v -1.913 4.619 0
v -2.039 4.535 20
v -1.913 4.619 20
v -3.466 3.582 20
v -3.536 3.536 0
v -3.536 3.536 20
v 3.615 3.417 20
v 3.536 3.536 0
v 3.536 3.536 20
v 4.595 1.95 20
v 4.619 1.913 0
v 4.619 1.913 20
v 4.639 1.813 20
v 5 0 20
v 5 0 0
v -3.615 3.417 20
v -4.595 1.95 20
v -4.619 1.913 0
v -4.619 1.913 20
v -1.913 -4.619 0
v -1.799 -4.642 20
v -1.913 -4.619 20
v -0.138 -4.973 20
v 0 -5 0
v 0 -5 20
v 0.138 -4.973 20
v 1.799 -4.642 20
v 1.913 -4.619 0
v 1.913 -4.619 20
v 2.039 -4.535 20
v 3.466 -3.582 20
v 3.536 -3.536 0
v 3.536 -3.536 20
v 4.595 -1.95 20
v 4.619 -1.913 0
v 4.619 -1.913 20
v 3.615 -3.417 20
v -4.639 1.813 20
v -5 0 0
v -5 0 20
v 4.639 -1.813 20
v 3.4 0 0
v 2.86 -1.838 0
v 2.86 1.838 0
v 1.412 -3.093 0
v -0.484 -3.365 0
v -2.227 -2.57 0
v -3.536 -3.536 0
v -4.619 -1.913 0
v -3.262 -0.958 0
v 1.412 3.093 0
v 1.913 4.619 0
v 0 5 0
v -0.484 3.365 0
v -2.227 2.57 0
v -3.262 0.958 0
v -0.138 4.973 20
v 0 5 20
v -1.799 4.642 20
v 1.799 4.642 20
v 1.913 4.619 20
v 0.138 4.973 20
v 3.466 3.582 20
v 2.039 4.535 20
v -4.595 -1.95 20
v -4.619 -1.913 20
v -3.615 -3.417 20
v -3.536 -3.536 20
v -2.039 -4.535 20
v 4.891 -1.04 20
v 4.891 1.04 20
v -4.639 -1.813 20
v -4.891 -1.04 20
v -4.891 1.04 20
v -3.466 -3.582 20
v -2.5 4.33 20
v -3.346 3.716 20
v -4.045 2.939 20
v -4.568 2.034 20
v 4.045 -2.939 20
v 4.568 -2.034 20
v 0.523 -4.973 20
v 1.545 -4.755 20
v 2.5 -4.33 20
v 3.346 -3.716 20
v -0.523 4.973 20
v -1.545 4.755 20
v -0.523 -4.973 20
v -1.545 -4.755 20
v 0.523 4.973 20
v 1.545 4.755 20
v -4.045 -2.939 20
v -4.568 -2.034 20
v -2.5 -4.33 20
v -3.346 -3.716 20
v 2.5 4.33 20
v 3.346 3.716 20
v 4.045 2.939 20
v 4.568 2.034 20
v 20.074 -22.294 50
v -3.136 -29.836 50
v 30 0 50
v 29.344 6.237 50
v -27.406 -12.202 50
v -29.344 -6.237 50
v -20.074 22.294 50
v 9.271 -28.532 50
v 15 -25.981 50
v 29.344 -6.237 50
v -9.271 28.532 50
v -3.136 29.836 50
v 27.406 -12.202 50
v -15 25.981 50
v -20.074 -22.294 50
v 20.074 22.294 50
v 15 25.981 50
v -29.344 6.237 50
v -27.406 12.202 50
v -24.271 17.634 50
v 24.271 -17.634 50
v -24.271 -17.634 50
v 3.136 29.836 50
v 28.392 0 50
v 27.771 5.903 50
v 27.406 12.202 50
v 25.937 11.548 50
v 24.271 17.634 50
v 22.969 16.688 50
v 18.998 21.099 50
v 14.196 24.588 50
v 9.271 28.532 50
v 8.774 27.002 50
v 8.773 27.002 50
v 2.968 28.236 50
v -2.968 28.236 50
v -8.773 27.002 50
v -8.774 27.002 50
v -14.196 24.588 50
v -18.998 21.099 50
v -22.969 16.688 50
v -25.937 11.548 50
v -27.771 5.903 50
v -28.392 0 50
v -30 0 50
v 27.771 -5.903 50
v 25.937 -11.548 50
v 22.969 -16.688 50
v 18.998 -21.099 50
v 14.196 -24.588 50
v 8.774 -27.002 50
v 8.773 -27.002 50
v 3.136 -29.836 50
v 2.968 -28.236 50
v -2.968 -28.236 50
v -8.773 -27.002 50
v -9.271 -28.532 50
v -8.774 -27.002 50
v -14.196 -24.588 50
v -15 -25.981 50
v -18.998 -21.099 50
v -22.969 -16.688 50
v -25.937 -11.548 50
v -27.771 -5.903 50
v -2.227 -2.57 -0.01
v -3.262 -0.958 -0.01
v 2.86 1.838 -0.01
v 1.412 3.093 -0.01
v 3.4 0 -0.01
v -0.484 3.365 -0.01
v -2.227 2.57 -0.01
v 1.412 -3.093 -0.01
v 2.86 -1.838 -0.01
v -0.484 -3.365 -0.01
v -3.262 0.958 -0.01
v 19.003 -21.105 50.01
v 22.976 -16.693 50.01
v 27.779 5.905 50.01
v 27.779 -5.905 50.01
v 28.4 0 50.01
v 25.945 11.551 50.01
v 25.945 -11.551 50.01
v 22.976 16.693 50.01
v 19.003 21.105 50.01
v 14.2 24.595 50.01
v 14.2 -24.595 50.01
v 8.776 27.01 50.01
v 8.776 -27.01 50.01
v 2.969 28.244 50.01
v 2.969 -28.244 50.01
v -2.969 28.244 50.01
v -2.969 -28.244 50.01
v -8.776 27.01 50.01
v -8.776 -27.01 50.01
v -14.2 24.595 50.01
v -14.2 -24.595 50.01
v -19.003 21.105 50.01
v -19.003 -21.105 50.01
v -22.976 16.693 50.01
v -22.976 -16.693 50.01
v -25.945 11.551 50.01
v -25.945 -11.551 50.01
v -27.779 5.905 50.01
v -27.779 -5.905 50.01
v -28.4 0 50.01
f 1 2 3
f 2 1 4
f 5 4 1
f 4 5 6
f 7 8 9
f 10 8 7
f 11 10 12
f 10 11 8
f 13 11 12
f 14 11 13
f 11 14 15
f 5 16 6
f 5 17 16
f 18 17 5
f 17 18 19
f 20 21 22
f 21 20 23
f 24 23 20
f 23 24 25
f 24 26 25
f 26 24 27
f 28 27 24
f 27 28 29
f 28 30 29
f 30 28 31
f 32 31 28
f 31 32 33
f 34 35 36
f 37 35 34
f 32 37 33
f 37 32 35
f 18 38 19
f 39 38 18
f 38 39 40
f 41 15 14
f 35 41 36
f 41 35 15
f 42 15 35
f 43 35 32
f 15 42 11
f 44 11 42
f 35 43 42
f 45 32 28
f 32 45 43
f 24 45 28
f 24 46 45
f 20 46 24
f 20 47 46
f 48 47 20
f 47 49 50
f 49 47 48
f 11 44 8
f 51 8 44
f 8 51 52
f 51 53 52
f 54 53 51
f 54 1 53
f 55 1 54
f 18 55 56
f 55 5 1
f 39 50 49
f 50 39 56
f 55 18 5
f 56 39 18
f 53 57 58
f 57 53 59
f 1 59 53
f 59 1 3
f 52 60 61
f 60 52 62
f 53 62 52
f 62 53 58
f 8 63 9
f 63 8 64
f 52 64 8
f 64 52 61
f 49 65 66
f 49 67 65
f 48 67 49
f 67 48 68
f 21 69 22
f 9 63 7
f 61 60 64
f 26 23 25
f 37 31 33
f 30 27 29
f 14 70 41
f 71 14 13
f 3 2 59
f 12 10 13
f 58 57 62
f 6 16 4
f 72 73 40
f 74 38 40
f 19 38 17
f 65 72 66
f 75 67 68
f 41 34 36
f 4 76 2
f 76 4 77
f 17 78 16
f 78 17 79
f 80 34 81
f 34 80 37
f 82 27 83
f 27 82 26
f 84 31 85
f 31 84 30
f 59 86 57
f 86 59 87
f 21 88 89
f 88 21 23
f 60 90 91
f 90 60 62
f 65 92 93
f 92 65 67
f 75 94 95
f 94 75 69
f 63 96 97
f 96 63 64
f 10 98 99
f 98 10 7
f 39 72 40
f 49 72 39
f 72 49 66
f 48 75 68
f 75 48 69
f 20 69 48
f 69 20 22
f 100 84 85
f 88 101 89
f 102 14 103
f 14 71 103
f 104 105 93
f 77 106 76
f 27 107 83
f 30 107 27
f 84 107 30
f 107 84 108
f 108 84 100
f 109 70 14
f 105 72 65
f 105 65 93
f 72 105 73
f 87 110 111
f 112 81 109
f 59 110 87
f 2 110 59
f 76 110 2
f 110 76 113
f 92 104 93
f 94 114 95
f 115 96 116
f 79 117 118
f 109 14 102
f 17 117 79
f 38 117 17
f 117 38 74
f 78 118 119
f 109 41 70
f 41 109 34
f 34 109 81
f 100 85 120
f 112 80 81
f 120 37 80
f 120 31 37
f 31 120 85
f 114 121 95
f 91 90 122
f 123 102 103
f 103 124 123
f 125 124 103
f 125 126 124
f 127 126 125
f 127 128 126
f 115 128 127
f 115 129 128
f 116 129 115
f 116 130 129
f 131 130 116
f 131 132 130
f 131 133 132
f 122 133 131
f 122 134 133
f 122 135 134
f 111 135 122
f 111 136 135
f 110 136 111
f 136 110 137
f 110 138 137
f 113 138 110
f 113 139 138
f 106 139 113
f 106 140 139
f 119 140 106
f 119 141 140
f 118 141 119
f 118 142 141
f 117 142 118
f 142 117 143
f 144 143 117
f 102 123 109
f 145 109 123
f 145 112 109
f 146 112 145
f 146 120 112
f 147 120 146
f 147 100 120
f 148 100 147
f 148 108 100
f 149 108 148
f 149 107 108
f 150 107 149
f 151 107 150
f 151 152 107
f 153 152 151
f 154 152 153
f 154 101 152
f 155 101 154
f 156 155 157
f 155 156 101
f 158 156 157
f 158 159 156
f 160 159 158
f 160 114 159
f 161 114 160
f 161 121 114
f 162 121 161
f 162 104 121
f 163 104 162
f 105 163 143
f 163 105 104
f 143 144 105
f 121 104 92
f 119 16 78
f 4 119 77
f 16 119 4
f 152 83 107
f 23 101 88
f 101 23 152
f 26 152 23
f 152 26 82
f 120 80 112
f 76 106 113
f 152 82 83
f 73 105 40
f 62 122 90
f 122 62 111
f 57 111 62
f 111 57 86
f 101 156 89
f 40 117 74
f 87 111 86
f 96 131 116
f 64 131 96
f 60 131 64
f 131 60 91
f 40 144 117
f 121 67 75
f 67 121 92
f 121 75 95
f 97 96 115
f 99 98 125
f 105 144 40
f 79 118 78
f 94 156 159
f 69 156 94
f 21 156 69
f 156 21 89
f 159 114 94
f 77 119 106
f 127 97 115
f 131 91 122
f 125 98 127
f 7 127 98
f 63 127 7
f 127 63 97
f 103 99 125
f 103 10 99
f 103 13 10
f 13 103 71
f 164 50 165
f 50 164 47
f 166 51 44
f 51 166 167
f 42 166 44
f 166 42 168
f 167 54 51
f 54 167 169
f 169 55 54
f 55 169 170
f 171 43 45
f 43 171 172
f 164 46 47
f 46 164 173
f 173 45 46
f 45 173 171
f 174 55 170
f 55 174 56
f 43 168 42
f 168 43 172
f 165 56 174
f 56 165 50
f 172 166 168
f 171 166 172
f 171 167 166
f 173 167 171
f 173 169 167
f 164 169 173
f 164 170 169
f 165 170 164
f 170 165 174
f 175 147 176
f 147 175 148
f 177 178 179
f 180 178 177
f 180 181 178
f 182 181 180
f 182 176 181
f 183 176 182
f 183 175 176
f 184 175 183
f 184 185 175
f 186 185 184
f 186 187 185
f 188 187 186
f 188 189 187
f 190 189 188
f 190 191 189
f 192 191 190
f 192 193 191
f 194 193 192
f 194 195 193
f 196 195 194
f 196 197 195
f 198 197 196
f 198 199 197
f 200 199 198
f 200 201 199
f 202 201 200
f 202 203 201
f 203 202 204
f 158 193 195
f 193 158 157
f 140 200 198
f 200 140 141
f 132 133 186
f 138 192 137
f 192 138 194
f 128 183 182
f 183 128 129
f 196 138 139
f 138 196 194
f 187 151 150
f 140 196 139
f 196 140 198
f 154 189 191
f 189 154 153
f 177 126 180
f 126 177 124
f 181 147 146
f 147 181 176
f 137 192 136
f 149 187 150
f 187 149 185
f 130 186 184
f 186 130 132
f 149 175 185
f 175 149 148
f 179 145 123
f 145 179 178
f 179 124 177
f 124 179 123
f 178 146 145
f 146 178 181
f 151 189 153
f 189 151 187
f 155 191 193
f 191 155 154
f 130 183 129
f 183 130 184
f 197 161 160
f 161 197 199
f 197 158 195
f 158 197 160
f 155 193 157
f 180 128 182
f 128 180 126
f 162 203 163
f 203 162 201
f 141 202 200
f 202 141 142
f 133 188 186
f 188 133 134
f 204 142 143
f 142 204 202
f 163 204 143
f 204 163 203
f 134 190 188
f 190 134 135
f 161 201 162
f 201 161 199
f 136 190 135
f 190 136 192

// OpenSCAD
// Lab Funnel Design
// Dimensions measured in mm, printed upright (XY plane at z=0)

// --- User Specifications ---
spout_od = 10;          // Outer diameter of spout
spout_height = 20;      // Height of spout section
funnel_top_od = 60;     // Outer diameter at the rim
funnel_total_height = 50; // Total height of the part
wall_thickness = 1.6;   // Wall thickness everywhere

// --- Calculated Dimensions ---
spout_id = spout_od - 2 * wall_thickness;
funnel_base_id = spout_id; // Funnel base ID matches spout ID
funnel_top_id = funnel_top_od - 2 * wall_thickness;

// Radii
spout_r_out = spout_od / 2;
spout_r_in = spout_id / 2;
funnel_base_r_out = spout_od / 2;
funnel_base_r_in = spout_id / 2;
funnel_top_r_out = funnel_top_od / 2;
funnel_top_r_in = funnel_top_id / 2;

// --- Geometry Construction ---

module funnel() {
    // 1. Create the solid outer shell (Spout + Cone)
    // We build this as a single solid object first.
    
    // Spout section (Cylinder)
    cylinder(h = spout_height, r = spout_r_out, center = false);
    
    // Funnel section (Cone)
    // Base at z = spout_height, Top at z = funnel_total_height
    // We use a cylinder with r1 and r2 to create the taper
    translate([0, 0, spout_height])
    cylinder(h = funnel_total_height - spout_height, r1 = funnel_base_r_out, r2 = funnel_top_r_out, center = false);
    
    // 2. Subtract the hollow interior
    // We create a solid shape representing the empty space and subtract it.
    // To ensure watertightness and avoid coplanar faces, we offset the cut slightly.
    
    // The hollow shape consists of a cylinder (spout) and a cone (funnel).
    // We combine them into a single subtraction object.
    
    // Subtraction Object:
    // A. Spout hole (Cylinder)
    // Offset z by 0.01 to ensure the cut goes slightly past the base of the spout
    // and slightly past the top of the spout to ensure the cone transition is clean.
    translate([0, 0, -0.01])
    cylinder(h = spout_height + 0.02, r = spout_r_in, center = false);
    
    // B. Funnel hole (Cone)
    // The cone hole starts exactly where the spout hole ends (z=20)
    // and goes to the top. We extend it slightly past the top to ensure the rim is open.
    translate([0, 0, spout_height - 0.01])
    cylinder(h = (funnel_total_height - spout_height) + 0.02, r1 = funnel_base_r_in, r2 = funnel_top_r_in, center = false);
}

// --- Main Execution ---
// Center the part on the XY plane (0,0)
// The part rests on z=0.
translate([0, 0, 0])
funnel();
